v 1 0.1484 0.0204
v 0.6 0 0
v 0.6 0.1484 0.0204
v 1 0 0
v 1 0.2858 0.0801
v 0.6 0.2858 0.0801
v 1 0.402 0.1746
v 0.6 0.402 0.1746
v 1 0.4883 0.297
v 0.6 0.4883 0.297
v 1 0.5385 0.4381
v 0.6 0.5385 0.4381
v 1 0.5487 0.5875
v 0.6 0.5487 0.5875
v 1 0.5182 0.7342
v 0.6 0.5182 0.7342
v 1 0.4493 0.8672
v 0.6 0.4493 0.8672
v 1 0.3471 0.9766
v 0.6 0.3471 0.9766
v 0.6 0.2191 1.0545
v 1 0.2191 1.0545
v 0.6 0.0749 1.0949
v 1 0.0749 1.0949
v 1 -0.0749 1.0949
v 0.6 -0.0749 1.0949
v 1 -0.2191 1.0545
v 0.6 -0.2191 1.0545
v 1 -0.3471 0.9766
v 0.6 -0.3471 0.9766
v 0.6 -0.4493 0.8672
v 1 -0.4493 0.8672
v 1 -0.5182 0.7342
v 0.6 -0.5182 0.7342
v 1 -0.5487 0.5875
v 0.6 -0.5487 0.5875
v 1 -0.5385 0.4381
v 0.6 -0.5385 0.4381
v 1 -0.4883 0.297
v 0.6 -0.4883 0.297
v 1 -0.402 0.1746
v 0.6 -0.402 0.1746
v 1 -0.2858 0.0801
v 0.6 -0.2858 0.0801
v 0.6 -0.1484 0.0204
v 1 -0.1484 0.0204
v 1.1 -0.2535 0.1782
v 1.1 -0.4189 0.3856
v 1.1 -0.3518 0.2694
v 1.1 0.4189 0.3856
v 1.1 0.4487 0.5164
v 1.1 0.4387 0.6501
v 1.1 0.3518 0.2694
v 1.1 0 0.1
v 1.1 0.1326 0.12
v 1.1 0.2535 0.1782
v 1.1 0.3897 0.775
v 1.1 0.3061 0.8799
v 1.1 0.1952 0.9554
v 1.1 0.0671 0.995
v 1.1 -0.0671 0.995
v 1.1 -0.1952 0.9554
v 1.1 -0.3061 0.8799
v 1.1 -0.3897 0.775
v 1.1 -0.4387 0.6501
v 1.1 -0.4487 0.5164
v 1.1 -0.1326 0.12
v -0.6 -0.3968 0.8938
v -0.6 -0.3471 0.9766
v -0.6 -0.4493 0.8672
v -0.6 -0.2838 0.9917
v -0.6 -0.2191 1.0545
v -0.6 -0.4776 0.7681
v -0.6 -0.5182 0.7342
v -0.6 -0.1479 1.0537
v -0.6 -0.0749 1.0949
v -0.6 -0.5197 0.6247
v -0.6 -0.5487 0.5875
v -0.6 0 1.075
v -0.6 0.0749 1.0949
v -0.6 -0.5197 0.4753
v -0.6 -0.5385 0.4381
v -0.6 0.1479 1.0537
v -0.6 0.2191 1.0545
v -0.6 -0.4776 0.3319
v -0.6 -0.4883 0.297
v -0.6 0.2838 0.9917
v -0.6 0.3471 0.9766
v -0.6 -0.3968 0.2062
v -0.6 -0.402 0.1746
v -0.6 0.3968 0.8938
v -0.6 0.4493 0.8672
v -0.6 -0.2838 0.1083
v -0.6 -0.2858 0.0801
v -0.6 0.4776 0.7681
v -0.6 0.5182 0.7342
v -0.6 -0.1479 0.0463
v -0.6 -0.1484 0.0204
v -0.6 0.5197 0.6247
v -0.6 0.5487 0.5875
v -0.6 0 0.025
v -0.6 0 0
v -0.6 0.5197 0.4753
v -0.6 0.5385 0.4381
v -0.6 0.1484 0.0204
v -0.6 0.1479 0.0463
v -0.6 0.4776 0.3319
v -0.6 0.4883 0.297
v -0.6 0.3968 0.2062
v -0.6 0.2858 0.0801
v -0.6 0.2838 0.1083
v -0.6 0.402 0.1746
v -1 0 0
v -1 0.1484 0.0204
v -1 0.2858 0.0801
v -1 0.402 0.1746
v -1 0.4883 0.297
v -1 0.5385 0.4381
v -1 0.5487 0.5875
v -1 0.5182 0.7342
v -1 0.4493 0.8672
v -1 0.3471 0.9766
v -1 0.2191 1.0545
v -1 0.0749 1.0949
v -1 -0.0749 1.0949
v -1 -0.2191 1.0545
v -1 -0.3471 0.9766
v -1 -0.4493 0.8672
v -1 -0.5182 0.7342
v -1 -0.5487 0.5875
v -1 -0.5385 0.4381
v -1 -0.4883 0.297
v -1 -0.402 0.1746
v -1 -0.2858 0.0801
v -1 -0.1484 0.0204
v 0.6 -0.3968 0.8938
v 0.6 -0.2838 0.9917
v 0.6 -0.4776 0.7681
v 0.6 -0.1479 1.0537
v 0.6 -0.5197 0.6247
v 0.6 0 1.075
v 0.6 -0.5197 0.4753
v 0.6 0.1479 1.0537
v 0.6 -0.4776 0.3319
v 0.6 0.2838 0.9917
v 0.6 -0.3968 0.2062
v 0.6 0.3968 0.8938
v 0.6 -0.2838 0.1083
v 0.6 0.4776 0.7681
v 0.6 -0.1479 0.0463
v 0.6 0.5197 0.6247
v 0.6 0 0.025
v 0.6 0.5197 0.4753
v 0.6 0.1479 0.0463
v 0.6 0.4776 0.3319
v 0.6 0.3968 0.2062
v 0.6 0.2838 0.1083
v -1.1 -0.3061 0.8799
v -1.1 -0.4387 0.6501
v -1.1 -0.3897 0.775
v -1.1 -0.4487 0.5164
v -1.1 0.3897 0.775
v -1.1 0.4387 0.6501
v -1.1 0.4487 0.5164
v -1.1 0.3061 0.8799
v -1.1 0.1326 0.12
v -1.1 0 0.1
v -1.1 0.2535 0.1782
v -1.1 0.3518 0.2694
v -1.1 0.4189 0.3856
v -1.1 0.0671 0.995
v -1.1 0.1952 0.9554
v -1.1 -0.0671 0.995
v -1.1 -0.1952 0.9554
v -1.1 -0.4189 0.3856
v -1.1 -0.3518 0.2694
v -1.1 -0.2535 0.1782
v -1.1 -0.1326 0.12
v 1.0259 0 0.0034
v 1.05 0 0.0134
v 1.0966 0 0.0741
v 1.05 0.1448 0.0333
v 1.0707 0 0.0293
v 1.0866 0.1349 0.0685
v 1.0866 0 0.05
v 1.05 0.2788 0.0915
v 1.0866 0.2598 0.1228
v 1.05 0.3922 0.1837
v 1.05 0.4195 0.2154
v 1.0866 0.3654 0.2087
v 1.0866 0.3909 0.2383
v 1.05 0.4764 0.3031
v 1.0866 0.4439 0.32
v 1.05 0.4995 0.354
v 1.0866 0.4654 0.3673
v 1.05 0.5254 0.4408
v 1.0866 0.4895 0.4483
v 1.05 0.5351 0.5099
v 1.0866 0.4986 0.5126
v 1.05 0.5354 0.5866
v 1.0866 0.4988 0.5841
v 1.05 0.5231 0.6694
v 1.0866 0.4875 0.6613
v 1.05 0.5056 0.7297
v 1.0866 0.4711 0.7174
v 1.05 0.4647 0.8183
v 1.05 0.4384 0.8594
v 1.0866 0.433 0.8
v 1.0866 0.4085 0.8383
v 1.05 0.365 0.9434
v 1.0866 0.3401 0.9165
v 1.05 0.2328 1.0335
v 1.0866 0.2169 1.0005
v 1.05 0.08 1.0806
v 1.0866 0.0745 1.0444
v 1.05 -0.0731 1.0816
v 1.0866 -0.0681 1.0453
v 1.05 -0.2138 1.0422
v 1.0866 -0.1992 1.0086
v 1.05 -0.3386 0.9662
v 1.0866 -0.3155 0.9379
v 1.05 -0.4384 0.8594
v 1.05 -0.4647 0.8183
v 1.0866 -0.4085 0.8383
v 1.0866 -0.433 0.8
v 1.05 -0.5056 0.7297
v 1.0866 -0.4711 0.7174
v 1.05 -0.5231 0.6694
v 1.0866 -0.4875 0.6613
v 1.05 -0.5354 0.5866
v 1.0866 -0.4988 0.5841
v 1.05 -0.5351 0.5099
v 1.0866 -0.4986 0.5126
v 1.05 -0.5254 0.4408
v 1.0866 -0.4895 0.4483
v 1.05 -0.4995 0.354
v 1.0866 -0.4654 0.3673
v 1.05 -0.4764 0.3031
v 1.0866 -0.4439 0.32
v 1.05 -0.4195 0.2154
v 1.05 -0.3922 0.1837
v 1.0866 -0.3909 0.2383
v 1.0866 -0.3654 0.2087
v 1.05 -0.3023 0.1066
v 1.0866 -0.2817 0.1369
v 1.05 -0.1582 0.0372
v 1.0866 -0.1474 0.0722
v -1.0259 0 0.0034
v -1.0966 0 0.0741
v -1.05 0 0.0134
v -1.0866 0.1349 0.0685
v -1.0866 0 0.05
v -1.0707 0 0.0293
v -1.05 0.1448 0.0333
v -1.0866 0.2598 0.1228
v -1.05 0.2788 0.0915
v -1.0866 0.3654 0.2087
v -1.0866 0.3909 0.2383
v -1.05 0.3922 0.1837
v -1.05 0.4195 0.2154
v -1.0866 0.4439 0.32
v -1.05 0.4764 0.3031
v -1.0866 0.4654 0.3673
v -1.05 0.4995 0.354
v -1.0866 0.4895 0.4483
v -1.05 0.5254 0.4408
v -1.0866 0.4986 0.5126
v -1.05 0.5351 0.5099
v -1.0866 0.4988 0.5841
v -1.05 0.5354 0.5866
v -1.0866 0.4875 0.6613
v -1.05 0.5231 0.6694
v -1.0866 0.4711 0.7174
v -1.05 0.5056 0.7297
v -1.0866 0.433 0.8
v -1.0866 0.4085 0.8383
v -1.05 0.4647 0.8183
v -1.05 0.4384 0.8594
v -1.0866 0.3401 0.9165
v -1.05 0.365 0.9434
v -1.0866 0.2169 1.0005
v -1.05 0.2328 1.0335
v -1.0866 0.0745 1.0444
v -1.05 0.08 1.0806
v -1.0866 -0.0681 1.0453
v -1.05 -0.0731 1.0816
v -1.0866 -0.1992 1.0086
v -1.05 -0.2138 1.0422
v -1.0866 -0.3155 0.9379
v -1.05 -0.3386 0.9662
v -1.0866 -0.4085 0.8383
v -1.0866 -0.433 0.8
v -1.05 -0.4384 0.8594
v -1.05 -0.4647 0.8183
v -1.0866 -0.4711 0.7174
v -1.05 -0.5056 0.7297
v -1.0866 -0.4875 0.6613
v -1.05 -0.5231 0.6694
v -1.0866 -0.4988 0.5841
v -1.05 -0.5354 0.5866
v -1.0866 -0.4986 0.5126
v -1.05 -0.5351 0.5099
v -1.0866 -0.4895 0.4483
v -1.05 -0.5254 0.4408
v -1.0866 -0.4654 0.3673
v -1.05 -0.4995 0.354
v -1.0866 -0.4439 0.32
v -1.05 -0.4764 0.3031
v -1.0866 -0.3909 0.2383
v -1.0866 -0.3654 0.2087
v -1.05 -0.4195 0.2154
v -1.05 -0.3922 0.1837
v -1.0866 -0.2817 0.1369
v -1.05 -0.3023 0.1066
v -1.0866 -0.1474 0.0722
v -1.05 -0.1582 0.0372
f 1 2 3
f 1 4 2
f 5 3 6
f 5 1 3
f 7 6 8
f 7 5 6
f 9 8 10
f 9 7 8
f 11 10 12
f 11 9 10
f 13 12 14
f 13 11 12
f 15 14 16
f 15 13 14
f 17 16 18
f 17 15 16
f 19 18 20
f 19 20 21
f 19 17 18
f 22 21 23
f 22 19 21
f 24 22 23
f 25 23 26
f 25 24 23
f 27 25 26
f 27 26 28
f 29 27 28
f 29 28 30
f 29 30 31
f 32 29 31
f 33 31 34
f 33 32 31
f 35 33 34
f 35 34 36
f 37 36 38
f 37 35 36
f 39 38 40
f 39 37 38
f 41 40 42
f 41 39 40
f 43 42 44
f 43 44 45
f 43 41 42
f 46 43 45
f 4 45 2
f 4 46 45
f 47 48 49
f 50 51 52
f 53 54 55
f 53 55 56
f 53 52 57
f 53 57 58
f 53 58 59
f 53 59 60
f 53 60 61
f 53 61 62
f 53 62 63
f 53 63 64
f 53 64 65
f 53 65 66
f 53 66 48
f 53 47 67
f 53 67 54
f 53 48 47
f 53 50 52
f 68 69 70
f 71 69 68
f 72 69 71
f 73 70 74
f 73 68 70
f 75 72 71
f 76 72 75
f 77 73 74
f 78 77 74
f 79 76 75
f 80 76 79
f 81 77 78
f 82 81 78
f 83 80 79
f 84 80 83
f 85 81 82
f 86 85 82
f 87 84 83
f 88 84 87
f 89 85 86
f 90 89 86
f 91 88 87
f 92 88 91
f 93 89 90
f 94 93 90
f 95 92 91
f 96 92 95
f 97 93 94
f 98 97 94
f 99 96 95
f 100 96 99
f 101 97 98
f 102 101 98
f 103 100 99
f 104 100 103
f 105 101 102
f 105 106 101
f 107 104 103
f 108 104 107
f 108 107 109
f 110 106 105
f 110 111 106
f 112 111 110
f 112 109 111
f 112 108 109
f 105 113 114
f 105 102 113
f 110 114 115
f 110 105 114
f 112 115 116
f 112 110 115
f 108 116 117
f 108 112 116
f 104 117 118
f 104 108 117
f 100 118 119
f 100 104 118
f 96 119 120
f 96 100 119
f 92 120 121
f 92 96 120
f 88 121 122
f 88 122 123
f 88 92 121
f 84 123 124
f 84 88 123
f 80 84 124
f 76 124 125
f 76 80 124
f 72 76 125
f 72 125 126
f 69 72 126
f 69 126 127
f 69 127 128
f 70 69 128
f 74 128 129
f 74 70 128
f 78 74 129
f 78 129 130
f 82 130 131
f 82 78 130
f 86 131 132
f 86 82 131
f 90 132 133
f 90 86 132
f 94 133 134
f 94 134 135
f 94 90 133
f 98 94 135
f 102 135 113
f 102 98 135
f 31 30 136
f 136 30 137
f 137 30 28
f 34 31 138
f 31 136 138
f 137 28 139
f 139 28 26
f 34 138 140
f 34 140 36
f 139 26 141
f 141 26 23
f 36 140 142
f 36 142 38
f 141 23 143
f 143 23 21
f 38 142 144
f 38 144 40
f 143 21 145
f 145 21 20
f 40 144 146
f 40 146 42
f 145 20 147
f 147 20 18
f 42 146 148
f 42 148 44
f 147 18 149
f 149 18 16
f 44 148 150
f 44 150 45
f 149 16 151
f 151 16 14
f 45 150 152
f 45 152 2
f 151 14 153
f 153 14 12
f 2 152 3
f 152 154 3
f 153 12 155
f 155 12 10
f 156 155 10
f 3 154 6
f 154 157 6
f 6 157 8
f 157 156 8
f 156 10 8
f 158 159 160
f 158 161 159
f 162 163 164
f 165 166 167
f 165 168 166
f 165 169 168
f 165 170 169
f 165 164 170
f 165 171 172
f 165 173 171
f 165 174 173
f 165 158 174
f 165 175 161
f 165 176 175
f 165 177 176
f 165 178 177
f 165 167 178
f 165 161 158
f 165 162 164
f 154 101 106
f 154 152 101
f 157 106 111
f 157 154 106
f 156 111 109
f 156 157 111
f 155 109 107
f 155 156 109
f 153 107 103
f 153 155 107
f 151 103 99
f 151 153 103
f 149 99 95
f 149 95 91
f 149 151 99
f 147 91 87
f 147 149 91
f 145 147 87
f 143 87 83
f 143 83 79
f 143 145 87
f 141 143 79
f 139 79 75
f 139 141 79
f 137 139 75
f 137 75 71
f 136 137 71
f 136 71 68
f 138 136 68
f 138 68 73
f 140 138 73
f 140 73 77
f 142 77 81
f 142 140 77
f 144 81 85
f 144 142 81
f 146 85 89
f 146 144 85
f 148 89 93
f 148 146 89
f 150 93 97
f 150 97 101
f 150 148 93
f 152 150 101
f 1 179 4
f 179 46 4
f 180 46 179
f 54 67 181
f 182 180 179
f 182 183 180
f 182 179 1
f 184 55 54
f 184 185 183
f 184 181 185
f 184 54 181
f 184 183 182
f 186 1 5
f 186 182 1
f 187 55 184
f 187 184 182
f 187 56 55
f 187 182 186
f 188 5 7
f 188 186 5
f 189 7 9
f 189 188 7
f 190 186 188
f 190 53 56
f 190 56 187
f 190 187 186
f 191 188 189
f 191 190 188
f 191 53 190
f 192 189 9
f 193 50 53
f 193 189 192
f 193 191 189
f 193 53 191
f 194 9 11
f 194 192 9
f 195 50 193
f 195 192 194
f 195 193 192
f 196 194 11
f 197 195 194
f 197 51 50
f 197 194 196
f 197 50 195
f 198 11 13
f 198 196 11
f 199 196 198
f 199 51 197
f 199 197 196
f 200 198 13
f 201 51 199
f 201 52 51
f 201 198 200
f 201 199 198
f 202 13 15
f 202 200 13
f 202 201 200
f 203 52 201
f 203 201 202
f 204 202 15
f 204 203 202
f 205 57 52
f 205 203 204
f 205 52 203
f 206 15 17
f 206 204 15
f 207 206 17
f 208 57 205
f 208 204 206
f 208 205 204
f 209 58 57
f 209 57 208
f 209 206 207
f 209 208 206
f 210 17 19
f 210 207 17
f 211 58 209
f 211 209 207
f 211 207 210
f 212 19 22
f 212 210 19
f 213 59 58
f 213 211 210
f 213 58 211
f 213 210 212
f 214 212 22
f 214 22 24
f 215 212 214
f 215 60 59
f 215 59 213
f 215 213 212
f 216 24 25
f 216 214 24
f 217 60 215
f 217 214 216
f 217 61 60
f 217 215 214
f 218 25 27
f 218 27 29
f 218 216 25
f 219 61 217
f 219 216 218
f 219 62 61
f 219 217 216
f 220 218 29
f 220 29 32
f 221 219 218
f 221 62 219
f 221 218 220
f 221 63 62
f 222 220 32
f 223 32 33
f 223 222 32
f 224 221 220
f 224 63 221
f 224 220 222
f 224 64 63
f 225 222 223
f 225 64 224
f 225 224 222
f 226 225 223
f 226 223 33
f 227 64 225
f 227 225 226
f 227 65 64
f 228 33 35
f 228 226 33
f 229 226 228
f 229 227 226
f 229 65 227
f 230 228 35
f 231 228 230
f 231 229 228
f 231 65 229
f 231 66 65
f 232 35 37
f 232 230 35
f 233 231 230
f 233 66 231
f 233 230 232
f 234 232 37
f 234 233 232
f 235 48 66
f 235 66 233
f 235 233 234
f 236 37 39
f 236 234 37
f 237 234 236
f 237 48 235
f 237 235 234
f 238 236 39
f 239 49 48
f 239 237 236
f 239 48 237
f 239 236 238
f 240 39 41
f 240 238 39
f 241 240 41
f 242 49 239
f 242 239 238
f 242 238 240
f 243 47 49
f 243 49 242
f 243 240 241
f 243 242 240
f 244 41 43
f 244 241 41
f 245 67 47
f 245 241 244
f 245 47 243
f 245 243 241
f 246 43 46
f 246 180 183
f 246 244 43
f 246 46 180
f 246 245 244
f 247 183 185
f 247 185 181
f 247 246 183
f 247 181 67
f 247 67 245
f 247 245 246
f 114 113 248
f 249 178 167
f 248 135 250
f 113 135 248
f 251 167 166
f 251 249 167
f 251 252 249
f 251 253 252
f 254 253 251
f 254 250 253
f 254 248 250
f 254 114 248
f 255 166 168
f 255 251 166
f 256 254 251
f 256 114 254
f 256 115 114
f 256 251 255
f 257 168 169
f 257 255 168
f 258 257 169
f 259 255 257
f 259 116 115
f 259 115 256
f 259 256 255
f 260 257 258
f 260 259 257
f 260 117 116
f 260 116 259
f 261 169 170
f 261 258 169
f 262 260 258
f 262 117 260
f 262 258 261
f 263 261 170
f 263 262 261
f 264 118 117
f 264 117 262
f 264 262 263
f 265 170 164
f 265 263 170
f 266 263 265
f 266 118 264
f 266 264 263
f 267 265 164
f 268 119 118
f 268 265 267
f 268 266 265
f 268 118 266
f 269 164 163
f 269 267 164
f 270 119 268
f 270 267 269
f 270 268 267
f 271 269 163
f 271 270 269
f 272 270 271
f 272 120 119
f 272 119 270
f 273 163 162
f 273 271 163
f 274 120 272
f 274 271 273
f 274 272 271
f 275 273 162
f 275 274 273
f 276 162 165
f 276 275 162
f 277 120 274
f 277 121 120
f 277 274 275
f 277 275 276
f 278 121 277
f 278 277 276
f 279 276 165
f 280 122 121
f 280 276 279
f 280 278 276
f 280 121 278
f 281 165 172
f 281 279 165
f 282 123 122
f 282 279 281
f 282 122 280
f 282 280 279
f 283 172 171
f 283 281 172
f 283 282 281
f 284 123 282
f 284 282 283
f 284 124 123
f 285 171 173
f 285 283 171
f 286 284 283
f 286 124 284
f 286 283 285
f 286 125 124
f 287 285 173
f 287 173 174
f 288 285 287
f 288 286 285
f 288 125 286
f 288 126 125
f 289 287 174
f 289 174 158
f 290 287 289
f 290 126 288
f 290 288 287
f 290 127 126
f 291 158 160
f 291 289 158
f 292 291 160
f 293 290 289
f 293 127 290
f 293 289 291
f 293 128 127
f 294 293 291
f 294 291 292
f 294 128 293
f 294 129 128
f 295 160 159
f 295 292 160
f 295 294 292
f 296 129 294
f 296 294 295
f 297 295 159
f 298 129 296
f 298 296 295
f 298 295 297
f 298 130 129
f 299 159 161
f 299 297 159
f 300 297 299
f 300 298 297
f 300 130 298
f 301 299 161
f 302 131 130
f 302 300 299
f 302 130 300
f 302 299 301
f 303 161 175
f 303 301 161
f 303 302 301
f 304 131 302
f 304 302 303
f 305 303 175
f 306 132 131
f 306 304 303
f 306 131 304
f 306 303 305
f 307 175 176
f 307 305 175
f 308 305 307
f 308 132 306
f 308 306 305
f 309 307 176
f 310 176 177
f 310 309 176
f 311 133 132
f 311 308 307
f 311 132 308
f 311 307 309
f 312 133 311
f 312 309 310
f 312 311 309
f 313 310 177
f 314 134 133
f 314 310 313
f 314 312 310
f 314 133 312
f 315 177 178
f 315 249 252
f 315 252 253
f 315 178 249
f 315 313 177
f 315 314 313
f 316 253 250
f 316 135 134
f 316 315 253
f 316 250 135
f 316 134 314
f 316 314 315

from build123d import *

# Parameters (mm, degrees)
SKETCH_W = 1.7
SKETCH_H = 0.525


with BuildPart() as revolution:
    # Sketch → Revolution (revolve)
    with BuildSketch(Plane.XZ):
        with Locations((0, 0.2875)):
            Rectangle(SKETCH_W, SKETCH_H)
    revolve(axis=Axis((-15.061842, 0, 0.55), (1, 0, 0)))


with BuildPart() as fusion:
    # Sketch001 → Revolution001 (revolve)
    with BuildSketch(Plane.XZ):
        with BuildLine():
            Line((-1, 0), (-0.6, 0))
            Line((-0.6, 0), (-0.6, 0.45))
            Line((-0.6, 0.45), (0.6, 0.45))
            Line((0.6, 0), (0.6, 0.45))
            Line((0.6, 0), (1, 0))
            ThreePointArc((1, 0), (1.070711, 0.029289), (1.1, 0.1))
            Line((1.1, 0.1), (1.1, 0.55))
            Line((-1.1, 0.55), (1.1, 0.55))
            Line((-1.1, 0.55), (-1.1, 0.1))
            ThreePointArc((-1.1, 0.1), (-1.070711, 0.029289), (-1, 0))
        make_face()
    revolve(axis=Axis((-8.9, 0, 0.55), (1, 0, 0)))

    # Fusion: union Revolution
    add(revolution.part)


solid = fusion.part
